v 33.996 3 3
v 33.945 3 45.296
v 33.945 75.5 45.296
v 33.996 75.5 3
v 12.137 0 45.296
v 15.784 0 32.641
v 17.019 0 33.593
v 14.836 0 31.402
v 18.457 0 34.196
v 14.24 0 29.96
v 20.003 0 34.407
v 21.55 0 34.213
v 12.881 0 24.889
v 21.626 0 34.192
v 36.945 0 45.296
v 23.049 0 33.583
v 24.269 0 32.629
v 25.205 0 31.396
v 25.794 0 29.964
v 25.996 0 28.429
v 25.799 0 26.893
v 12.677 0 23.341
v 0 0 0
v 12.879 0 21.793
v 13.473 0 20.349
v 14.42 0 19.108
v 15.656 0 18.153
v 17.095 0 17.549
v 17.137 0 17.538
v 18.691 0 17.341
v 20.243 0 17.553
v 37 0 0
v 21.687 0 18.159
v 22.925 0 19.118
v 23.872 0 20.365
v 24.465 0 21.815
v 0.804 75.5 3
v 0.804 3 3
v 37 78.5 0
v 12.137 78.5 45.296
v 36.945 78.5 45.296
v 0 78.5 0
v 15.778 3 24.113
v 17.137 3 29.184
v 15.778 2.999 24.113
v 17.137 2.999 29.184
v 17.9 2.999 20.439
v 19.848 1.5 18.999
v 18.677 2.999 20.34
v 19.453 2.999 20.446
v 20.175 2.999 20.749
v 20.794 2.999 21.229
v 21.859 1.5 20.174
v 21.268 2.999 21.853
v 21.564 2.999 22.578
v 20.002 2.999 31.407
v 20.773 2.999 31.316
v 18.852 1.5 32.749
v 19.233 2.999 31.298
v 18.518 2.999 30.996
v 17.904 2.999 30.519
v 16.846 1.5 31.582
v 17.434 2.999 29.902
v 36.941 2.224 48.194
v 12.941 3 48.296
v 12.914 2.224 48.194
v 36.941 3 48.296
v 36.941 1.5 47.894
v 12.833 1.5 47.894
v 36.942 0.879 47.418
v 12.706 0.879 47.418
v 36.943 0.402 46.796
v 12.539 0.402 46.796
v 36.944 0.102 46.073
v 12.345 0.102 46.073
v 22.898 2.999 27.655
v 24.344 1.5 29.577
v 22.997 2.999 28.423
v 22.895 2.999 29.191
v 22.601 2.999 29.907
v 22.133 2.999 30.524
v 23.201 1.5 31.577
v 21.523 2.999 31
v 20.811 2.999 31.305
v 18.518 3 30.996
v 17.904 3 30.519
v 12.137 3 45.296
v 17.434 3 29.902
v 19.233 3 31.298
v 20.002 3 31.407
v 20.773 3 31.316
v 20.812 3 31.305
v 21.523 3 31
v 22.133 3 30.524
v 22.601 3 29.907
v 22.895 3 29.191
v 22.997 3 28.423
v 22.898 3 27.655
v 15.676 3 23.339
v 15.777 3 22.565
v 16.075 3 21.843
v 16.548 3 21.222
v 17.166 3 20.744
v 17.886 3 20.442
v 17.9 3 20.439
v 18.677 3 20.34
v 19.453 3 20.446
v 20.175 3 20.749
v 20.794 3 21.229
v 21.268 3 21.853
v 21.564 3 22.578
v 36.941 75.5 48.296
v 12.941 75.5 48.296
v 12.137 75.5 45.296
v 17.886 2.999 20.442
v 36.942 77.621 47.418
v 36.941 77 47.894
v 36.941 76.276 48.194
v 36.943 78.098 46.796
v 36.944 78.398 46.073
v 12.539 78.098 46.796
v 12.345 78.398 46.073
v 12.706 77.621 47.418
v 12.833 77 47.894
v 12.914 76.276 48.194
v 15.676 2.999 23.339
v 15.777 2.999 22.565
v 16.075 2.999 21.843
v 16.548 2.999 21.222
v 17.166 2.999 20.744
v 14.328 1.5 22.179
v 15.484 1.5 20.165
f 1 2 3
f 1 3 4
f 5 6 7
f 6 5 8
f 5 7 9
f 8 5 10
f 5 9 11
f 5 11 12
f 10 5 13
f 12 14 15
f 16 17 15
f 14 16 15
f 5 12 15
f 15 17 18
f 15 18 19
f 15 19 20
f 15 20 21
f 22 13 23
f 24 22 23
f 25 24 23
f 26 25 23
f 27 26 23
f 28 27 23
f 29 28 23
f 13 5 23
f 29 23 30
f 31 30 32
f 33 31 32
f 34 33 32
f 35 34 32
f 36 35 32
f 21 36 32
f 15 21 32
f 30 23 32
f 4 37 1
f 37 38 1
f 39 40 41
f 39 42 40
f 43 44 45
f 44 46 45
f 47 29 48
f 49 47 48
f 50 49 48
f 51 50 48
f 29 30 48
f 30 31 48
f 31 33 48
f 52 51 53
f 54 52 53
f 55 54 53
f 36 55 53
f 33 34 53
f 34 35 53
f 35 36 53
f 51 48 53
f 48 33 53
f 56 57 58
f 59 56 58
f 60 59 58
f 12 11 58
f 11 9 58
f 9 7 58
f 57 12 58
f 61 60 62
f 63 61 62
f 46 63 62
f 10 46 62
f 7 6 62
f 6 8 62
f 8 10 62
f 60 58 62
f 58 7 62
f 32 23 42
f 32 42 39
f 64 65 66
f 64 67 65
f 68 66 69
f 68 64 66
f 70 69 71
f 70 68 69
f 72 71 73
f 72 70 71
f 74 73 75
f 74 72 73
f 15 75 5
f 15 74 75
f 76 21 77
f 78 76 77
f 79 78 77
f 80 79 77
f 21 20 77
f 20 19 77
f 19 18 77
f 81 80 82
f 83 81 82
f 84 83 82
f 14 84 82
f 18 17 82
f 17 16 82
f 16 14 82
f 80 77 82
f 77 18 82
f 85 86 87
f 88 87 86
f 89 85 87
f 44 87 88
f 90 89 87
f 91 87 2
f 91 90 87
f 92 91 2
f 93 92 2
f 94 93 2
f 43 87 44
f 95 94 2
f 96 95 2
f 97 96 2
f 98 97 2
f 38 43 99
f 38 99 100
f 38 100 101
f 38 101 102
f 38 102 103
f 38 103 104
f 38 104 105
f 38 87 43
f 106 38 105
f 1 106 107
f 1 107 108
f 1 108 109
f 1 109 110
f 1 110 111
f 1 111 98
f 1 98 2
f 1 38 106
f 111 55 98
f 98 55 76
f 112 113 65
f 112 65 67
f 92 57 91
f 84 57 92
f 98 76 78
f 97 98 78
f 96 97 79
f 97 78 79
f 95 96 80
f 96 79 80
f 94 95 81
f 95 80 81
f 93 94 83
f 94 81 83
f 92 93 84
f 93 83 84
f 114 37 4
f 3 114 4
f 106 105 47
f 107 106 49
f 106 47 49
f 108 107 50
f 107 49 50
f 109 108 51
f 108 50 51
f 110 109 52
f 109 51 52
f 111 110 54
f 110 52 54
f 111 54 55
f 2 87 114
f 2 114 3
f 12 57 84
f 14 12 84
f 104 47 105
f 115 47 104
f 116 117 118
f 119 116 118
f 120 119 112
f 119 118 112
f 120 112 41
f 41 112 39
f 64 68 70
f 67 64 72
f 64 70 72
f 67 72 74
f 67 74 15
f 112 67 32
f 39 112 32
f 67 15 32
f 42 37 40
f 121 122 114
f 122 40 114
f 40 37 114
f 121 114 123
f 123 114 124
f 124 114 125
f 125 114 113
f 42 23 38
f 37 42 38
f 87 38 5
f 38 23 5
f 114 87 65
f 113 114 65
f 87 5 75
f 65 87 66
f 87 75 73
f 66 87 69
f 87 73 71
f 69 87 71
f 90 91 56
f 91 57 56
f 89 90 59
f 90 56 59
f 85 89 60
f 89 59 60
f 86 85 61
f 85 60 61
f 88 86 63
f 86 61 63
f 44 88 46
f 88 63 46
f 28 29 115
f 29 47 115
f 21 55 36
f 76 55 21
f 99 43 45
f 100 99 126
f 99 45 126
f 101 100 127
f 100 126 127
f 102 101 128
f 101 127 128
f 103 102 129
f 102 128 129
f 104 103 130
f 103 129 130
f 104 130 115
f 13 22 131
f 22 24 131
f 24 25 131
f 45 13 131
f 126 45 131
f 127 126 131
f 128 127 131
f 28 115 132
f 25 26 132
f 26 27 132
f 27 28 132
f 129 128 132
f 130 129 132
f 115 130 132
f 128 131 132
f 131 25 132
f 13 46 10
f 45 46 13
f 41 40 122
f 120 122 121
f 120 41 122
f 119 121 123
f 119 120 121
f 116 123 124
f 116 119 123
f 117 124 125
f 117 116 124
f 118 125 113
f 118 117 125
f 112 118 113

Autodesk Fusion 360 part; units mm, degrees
sketch "Sketch1" plane through (0, 0, 0) normal (0, 1, 0) x (1, 0, 0)
  line L0 (0, 0) -> (24, 0)
  line L1 (0, 0) -> (12.941, -48.2963)
  line L2 (0, 0) -> (50, 0) construction
  line L3 (24, 0) -> (36.941, -48.2963)
  line L4 (24, 0) -> (74, 0) construction
  line L5 (12.941, -48.2963) -> (36.941, -48.2963)
  line L6 (36.941, -48.2963) -> (37, 0)
  line L7 (24, 0) -> (37, 0)
  dimension "d1" = 24
  dimension "d2" = 75
  dimension "d3" = 50
  dimension "d4" = 50
  dimension "d5" = 75
extrude "Extrude1" add sketch "Sketch1" along normal blind 78.5
shell "Shell1" thickness 3 removed faces 1 at (4.3137, 26.1667, 16.0988)
sketch "Sketch2" plane through (0, 0, 0) normal (0, -1, 0) x (1, 0, 0)
  line L0 (12.941, 48.2963) -> (0, 0)
  line L1 (0, 0) -> (37, 0)
  line L2 (36.941, 48.2963) -> (12.941, 48.2963)
  line L3 (17.8998, 20.4386) -> (17.8858, 20.4424)
  line L4 (21.5638, 22.5776) -> (22.8982, 27.6553)
  line L5 (20.7731, 31.3156) -> (20.8115, 31.3053)
  line L6 (17.1373, 29.184) -> (15.7785, 24.1128)
  arc A0 (20.8115, 31.3053) -> (17.1373, 29.184) centre (20.0351, 28.4075) ccw
  arc A1 (15.7785, 24.1128) -> (17.8998, 20.4386) centre (18.6763, 23.3364) ccw
  arc A2 (17.8858, 20.4424) -> (21.5638, 22.5776) centre (18.6623, 23.3401) ccw
  arc A3 (22.8982, 27.6553) -> (20.7731, 31.3156) centre (19.9967, 28.4178) ccw
  line L7 (37, 0) -> (36.941, 48.2963)
  point P0 (15.002, 21.2151)
  point P1 (20.7976, 19.6622)
  point P2 (17.9138, 32.0817)
  dimension "d9" = 6
  dimension "d10" = 11.25
  dimension "d11" = 9
  dimension "d12" = 24.375
  dimension "d13" = 3
extrude "Extrude2" cut sketch "Sketch2" against normal blind 18 contours L3 L4 L5 L6 A0 A1 A2 A3
chamfer "Chamfer1" distance 3 angle 45 6 edges at (20.1717, 0, 20.7475) (22.231, 0, 25.1165) (22.5961, 0, 29.9154) (16.4579, 0, 26.6484) (16.0764, 0, 21.8395) (18.5265, 0, 31.0006)
fillet "Fillet1" radius 3 2 edges at (24.941, 0, 48.2963) (24.941, 78.5, 48.2963)
equation "d12 = 30 mm - ( 11.25 / 2 ) * 1 mm"
